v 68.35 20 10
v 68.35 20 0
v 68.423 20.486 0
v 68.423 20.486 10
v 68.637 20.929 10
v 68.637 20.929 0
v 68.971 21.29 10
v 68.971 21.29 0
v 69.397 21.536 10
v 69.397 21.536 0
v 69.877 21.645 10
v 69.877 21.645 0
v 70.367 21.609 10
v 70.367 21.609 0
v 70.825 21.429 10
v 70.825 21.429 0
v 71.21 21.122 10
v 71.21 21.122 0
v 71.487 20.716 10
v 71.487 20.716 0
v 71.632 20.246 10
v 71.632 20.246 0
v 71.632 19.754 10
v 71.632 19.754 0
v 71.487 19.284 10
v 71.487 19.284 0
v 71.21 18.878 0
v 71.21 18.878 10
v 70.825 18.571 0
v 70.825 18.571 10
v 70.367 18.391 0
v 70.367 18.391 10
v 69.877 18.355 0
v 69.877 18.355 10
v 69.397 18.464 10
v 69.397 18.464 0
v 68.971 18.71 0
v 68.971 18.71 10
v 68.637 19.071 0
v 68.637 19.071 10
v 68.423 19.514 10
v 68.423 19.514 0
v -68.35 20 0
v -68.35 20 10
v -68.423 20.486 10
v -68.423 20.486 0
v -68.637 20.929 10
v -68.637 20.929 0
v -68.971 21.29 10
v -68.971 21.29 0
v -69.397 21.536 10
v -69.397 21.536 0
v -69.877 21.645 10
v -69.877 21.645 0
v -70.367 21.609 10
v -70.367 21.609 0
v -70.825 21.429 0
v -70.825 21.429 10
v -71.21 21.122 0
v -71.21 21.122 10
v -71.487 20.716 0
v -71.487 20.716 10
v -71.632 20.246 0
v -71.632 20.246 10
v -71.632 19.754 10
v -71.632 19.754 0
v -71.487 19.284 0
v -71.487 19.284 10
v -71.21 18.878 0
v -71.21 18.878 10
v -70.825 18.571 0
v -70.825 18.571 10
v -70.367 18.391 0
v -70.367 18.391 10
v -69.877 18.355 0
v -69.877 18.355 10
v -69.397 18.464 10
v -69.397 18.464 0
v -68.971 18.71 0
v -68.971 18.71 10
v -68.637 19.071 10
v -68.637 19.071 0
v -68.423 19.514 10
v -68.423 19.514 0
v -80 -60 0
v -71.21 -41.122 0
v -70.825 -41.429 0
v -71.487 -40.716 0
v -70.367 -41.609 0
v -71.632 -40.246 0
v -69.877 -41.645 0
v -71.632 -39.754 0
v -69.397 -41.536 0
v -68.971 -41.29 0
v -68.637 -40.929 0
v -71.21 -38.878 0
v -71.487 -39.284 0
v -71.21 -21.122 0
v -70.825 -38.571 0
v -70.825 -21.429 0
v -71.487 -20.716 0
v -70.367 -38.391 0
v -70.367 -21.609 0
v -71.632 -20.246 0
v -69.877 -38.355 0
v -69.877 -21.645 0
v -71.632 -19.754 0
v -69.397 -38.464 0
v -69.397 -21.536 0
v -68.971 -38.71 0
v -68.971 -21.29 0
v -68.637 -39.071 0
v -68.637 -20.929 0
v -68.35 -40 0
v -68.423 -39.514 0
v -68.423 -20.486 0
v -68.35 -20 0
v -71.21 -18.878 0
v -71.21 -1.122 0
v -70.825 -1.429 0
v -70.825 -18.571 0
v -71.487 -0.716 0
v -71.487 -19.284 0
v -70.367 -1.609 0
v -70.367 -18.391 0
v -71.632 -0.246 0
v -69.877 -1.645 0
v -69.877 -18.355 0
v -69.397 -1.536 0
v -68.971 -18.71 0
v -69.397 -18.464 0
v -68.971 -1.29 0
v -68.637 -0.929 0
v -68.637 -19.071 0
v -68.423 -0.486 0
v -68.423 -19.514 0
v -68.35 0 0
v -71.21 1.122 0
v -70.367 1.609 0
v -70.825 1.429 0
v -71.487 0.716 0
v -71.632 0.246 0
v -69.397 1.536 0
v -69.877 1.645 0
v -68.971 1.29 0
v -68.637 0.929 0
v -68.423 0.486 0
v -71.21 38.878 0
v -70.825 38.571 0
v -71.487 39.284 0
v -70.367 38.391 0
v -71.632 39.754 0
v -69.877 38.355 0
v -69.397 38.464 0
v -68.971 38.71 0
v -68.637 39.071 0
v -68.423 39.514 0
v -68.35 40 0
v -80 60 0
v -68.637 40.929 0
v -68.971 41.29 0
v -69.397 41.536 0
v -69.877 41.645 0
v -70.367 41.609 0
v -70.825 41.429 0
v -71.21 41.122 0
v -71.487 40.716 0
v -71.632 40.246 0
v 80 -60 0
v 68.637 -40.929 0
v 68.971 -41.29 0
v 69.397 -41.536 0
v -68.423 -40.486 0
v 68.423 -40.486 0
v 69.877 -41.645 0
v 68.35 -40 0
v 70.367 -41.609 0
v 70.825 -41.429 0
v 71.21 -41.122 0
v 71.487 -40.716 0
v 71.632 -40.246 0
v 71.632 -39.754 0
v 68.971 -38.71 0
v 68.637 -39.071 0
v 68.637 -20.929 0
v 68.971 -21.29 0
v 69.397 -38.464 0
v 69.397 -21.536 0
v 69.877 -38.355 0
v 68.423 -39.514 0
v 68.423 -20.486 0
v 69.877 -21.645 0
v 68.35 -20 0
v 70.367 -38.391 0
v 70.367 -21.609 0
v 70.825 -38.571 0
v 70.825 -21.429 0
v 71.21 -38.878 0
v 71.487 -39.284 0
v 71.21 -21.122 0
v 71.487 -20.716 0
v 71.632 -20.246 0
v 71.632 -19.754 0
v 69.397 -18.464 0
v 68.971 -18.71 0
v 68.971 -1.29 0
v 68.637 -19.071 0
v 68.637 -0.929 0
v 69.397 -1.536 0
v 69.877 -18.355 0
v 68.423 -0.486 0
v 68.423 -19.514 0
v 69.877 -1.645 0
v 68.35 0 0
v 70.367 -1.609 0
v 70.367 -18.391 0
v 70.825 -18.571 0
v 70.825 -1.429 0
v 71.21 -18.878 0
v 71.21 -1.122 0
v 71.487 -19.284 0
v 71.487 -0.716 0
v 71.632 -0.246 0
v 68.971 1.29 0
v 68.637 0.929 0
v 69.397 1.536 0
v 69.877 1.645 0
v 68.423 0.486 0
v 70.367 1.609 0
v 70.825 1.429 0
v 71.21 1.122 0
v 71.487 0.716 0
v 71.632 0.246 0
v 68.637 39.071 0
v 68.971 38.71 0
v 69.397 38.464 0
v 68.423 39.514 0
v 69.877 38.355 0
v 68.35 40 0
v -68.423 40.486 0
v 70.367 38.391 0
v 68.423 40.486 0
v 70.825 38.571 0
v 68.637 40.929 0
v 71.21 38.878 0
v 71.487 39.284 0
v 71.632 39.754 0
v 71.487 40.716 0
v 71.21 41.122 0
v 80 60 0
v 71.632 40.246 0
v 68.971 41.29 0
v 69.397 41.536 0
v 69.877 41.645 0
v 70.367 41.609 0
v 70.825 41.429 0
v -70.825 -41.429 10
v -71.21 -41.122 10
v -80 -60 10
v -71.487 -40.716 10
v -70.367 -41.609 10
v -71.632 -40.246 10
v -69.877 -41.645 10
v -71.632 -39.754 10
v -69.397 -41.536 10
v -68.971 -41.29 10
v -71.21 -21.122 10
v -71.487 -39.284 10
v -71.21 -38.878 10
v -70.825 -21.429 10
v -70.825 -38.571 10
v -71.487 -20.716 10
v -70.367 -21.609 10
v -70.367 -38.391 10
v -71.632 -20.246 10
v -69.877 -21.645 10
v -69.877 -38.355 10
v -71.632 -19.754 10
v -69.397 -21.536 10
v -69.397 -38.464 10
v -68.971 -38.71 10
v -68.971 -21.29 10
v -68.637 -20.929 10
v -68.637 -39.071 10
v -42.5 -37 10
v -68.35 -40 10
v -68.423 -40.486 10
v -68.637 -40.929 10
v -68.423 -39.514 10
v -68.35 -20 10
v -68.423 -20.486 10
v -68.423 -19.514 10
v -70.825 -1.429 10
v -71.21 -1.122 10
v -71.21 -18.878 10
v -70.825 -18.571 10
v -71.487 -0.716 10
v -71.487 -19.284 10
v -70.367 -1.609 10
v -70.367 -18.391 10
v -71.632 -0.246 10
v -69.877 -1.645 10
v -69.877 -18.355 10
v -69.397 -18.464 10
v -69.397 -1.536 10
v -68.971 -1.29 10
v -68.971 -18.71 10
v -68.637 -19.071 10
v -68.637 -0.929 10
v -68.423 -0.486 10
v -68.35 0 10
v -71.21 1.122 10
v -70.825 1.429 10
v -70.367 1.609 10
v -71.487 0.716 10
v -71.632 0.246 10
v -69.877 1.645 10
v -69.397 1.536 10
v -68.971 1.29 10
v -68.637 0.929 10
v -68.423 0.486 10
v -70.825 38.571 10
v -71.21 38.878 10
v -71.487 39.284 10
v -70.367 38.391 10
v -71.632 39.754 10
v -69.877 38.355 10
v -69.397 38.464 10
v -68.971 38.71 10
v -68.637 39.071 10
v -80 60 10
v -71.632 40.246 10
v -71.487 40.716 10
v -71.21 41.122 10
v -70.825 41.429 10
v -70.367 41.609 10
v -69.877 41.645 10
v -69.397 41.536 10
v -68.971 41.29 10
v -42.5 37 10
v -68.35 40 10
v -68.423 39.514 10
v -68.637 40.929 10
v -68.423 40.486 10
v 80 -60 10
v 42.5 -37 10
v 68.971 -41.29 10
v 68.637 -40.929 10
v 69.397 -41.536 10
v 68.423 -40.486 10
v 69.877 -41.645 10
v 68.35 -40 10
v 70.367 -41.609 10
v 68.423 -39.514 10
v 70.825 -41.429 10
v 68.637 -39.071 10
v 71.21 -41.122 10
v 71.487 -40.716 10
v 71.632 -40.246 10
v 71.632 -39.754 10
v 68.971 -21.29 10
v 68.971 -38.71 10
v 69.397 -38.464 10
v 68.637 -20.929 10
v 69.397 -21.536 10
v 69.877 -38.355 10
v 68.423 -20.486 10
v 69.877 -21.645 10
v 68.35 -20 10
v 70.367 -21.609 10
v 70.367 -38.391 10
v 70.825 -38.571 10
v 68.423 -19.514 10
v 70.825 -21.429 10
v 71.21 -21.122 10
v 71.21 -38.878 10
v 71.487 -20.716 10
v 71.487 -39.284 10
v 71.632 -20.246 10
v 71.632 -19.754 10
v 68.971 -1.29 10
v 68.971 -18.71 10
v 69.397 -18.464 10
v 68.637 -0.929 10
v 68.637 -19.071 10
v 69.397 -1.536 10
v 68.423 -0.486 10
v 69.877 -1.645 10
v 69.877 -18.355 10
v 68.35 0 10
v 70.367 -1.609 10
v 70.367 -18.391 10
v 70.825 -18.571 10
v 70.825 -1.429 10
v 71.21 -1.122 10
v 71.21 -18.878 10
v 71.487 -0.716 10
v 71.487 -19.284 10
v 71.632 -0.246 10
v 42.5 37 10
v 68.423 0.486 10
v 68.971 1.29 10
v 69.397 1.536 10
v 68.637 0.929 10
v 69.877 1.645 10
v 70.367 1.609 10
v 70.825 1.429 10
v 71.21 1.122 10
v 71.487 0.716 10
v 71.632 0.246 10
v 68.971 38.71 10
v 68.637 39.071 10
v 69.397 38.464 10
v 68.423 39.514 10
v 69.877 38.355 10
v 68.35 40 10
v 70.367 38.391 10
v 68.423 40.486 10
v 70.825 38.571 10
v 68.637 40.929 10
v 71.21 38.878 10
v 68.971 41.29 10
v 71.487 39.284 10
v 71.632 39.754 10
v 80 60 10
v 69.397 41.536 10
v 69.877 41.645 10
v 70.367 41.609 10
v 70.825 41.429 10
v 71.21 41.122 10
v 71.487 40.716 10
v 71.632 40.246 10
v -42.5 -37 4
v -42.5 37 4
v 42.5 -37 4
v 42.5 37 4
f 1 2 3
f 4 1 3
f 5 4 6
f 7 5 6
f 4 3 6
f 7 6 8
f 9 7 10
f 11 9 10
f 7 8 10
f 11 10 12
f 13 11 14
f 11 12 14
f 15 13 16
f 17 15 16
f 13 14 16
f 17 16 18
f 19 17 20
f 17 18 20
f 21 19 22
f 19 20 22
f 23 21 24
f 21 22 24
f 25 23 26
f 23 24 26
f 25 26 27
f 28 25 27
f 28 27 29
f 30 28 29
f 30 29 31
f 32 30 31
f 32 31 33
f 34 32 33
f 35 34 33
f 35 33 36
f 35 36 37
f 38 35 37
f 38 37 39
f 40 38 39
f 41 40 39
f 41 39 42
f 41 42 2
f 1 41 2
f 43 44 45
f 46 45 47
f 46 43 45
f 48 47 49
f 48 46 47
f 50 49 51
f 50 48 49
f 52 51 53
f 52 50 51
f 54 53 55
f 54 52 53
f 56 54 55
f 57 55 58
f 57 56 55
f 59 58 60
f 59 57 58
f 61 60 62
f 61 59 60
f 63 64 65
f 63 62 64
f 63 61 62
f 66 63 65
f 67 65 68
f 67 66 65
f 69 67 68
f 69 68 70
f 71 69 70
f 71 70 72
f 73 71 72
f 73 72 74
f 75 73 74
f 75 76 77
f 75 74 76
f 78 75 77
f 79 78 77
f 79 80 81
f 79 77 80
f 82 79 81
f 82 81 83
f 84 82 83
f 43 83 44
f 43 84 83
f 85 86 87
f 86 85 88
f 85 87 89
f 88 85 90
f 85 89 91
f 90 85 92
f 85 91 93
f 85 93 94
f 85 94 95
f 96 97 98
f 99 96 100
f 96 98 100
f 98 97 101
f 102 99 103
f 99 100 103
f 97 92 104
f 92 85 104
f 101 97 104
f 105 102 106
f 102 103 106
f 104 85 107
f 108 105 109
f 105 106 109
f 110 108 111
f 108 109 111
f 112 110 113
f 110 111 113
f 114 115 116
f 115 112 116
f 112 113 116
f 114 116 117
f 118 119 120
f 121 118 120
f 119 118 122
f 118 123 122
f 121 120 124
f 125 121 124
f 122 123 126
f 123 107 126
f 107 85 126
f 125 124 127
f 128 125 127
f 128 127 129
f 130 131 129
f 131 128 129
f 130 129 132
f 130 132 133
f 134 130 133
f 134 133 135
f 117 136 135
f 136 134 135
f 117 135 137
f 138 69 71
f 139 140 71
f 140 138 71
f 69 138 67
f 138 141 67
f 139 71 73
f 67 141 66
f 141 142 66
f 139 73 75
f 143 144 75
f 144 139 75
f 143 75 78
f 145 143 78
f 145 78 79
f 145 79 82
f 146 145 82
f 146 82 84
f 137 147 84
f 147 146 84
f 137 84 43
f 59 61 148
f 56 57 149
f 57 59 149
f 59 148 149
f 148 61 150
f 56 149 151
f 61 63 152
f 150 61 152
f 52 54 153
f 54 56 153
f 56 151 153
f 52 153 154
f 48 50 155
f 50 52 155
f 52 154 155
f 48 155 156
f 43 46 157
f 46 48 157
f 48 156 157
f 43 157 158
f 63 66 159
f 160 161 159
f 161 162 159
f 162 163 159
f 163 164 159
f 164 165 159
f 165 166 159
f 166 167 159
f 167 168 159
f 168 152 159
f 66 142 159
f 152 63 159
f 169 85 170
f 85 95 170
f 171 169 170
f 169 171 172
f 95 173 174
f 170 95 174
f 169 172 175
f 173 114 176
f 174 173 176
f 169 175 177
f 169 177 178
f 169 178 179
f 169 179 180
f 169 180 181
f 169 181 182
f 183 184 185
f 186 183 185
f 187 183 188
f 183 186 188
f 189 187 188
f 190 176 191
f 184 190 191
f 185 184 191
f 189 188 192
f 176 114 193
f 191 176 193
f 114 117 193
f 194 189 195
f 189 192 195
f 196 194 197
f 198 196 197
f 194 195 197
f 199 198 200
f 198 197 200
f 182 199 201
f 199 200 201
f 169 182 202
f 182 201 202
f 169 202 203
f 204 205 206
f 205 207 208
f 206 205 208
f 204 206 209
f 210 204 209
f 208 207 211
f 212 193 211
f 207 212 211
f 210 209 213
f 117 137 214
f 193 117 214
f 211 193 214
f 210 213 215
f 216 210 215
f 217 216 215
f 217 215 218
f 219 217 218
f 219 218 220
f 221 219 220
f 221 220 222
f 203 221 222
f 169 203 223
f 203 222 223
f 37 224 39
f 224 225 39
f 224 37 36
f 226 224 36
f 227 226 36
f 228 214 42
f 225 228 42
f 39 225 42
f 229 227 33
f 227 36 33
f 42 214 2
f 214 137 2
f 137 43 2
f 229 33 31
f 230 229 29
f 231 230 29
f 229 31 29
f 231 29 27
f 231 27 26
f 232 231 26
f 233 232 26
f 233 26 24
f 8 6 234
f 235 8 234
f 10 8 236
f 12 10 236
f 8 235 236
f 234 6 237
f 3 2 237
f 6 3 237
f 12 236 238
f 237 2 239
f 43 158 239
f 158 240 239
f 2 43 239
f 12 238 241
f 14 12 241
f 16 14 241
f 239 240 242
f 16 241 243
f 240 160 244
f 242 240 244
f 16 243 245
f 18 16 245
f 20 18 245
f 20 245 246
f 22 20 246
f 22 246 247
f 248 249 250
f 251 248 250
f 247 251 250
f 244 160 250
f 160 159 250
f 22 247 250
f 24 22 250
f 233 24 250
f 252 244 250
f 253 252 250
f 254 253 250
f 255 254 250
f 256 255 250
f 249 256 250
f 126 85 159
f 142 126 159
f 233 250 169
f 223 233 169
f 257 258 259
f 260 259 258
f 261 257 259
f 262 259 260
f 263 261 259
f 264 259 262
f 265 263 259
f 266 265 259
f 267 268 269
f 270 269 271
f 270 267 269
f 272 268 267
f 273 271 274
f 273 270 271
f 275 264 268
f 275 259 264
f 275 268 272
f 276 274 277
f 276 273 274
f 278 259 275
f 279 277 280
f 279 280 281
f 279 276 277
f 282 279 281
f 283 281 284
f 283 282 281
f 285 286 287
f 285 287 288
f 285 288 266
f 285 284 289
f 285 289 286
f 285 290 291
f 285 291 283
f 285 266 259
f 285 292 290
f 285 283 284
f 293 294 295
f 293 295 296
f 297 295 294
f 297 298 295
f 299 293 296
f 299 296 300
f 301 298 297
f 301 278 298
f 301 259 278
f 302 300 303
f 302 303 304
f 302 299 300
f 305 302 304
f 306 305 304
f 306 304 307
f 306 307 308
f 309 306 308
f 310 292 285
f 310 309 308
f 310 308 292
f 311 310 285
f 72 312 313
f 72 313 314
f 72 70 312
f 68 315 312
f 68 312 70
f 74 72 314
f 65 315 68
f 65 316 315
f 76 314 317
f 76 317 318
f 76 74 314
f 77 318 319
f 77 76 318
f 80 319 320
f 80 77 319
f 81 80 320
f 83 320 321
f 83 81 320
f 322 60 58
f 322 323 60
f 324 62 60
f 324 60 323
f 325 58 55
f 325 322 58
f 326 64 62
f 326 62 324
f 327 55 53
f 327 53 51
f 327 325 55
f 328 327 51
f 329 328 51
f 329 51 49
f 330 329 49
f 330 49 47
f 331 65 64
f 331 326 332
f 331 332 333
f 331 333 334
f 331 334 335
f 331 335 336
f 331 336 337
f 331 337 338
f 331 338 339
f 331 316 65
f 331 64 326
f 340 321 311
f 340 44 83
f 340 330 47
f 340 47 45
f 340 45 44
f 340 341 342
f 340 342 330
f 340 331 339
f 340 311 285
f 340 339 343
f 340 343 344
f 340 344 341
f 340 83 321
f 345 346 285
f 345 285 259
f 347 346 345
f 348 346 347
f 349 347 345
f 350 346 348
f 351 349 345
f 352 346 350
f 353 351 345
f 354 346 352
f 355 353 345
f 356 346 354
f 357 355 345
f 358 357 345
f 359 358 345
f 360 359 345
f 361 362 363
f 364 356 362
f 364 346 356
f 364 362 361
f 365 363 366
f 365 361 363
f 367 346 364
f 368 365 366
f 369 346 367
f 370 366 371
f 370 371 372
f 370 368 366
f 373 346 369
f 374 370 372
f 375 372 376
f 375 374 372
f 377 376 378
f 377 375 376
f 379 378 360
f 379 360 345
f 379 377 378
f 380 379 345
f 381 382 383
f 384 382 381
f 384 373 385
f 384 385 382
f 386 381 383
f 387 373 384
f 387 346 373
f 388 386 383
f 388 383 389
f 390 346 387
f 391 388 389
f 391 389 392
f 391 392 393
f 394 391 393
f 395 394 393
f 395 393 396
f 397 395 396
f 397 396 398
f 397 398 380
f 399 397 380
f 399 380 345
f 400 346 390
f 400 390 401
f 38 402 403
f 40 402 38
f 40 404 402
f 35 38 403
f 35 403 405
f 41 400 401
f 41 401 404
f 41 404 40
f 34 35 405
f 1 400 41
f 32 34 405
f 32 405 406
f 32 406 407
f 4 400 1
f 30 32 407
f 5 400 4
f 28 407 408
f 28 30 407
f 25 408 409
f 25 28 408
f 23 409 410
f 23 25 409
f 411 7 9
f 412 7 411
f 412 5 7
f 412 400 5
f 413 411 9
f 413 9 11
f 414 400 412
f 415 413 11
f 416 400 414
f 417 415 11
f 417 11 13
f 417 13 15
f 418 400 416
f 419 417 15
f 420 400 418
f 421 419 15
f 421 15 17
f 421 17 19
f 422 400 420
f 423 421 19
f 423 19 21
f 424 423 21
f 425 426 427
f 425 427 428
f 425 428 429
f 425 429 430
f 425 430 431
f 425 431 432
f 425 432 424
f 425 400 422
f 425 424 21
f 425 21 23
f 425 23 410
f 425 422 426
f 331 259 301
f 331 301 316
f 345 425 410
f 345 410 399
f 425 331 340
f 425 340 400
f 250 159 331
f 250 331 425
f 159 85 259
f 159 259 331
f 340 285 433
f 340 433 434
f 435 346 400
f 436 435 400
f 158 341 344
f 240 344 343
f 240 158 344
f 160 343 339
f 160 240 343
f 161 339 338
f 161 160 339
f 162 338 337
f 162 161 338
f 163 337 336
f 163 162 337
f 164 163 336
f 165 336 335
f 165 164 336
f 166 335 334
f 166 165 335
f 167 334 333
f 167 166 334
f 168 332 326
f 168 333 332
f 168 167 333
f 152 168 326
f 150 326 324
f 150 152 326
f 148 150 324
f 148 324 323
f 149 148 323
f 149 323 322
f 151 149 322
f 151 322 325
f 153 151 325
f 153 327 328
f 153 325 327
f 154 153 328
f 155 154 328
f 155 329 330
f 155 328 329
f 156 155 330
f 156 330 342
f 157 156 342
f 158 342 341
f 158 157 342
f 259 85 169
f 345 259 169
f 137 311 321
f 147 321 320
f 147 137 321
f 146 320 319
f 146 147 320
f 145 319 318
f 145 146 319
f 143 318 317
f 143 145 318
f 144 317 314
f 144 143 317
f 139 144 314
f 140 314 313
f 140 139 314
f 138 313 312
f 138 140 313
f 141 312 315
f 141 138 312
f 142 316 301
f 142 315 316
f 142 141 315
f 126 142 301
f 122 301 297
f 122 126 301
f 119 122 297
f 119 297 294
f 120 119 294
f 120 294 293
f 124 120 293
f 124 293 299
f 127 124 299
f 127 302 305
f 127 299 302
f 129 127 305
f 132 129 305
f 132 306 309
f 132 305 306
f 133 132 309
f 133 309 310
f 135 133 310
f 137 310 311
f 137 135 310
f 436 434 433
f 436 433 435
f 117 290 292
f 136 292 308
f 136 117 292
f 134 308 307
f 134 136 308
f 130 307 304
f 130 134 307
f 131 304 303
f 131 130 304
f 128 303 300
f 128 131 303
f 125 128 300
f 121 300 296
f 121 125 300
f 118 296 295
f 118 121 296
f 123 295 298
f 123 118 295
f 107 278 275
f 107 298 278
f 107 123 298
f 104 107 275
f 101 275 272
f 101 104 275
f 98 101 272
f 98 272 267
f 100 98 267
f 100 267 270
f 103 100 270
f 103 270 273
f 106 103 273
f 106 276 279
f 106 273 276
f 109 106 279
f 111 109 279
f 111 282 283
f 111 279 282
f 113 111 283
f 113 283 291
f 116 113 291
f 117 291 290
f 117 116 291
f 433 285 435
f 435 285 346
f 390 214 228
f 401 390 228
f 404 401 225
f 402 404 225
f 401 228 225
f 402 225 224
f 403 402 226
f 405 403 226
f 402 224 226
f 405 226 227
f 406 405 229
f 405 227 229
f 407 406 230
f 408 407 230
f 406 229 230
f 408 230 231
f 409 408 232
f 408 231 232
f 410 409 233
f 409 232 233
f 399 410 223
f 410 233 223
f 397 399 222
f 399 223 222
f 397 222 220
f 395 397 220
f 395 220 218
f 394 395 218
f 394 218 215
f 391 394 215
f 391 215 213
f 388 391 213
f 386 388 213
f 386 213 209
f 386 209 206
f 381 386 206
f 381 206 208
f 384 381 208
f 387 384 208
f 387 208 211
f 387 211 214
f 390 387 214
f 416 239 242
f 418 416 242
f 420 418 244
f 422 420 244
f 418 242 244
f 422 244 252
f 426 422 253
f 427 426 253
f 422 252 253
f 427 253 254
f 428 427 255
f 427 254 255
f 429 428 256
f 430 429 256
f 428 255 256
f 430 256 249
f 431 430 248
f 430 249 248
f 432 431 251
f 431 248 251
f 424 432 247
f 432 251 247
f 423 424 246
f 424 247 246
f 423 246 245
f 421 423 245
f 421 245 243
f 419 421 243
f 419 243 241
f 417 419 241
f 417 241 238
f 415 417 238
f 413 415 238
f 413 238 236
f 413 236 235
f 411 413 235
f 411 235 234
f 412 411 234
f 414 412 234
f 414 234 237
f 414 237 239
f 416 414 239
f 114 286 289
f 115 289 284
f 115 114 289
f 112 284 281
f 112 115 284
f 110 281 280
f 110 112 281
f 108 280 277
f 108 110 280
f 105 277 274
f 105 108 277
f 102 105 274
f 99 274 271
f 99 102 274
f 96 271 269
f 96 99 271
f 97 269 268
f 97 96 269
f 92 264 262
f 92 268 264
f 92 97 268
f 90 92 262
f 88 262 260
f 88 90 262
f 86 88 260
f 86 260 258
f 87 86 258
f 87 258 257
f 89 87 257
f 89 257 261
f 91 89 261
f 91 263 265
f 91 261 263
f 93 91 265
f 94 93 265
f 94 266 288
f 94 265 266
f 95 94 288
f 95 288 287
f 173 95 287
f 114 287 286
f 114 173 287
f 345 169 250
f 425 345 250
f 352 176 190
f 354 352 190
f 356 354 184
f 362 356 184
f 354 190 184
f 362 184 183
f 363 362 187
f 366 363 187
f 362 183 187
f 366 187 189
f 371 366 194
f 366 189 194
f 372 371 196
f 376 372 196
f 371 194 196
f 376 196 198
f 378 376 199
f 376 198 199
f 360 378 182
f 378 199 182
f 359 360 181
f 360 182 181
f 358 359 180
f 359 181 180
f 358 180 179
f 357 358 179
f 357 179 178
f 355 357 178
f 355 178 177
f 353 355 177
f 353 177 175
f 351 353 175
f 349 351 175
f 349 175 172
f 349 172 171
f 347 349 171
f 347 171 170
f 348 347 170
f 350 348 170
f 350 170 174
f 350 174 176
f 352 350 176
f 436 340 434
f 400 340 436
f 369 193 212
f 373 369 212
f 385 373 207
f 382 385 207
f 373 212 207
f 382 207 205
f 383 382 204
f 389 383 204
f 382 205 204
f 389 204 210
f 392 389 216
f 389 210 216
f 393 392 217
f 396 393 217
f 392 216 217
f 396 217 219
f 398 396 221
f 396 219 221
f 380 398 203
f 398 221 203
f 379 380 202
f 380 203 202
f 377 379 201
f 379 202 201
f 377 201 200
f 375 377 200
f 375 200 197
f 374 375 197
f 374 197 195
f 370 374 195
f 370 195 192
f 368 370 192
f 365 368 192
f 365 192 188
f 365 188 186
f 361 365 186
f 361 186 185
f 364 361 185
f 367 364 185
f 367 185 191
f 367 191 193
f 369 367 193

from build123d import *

# Parameters (mm, degrees)
SKETCH_1_W          = 160
SKETCH_1_H          = 120
EXTRUDE_1_DEPTH     = 10
SKETCH_2_W          = 85
SKETCH_2_H          = 74
CUT_EXTRUDE_1_DEPTH = 6
SKETCH_3_R          = 1.65
CUT_EXTRUDE_2_DEPTH = 101.498756211


with BuildPart() as part:
    # 草图1 → 凸台-拉伸1 (new body)
    with BuildSketch(Plane.XY):
        Rectangle(SKETCH_1_W, SKETCH_1_H)
    extrude(amount=EXTRUDE_1_DEPTH)

    # 草图2 → 切除-拉伸1 (cut)
    with BuildSketch(Plane.XY.offset(10)):
        Rectangle(SKETCH_2_W, SKETCH_2_H)
    extrude(amount=-CUT_EXTRUDE_1_DEPTH, mode=Mode.SUBTRACT)

    # 草图3 → 切除-拉伸2 (cut, through all)
    with BuildSketch(Plane(origin=(0, 0, 0), x_dir=(-1, 0, 0), z_dir=(0, 0, -1))):
        with Locations((-70, 40)):
            Circle(SKETCH_3_R)
        with Locations((-70, 20)):
            Circle(SKETCH_3_R)
        with Locations((-70, 0)):
            Circle(SKETCH_3_R)
        with Locations((-70, -20)):
            Circle(SKETCH_3_R)
        with Locations((-70, -40)):
            Circle(SKETCH_3_R)
    cut_extrude_2 = extrude(amount=-CUT_EXTRUDE_2_DEPTH, mode=Mode.SUBTRACT)

    # 镜向1: 切除-拉伸2 across plane
    add(cut_extrude_2.mirror(Plane(origin=(0, 0, 0), x_dir=(0, 0, 1), z_dir=(1, 0, 0))), mode=Mode.SUBTRACT)


solid = part.part
